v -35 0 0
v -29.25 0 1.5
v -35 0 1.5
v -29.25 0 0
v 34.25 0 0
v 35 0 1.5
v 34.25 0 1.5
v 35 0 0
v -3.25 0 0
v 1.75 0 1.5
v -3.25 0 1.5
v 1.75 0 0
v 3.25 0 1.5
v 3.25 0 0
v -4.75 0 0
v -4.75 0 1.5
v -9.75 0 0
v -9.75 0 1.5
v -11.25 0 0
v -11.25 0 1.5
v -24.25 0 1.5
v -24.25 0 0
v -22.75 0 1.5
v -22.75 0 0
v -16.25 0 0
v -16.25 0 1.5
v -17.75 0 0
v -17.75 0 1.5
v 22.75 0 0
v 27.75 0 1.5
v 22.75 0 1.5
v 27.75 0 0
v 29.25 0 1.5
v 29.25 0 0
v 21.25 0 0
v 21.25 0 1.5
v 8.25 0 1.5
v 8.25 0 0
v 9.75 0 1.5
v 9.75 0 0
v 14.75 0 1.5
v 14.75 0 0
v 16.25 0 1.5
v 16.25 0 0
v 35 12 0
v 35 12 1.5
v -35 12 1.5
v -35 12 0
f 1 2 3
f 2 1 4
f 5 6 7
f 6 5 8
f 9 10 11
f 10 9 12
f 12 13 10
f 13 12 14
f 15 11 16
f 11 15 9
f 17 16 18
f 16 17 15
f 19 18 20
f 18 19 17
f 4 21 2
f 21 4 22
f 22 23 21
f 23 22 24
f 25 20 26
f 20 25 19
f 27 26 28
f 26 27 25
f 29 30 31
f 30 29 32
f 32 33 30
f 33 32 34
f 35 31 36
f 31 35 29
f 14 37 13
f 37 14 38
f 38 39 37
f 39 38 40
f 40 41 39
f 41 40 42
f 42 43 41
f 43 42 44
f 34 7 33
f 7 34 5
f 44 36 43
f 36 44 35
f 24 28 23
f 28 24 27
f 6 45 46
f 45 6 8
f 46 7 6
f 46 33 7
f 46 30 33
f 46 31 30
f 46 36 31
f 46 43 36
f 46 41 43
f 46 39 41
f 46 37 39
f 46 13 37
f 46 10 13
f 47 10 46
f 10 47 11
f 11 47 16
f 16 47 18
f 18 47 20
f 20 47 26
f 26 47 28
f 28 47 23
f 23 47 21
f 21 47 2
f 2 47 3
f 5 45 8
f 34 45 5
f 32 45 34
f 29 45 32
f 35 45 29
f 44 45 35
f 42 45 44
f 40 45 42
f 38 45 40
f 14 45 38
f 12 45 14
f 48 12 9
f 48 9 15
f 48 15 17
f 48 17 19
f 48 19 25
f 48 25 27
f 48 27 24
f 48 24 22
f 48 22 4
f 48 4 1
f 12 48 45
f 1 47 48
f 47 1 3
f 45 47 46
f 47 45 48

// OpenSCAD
// 10-well agarose gel comb - printed lying flat
// Units: mm

plate_t      = 1.5;   // plate thickness (Z)
spine_len    = 70;    // spine length (X)
spine_w      = 12;    // spine width (Y)
tooth_count  = 10;    // number of teeth
tooth_w      = 5.0;   // tooth width (X)
tooth_len    = 12;    // tooth length (Y)
tooth_gap    = 1.5;   // gap between teeth (X)
eps          = 0.5;   // cutter overshoot

$fn = 64;

pitch = tooth_w + tooth_gap;  // 6.5 mm

difference() {
    // Spine
    translate([-spine_len/2, 0, 0])
        cube([spine_len, spine_w, plate_t]);

    // Teeth, centred on spine in X
    for (i = [0 : tooth_count - 1])
        translate([(i - (tooth_count - 1)/2) * pitch, -tooth_len, 0])
            cube([tooth_w, tooth_len, plate_t + eps]);
}
